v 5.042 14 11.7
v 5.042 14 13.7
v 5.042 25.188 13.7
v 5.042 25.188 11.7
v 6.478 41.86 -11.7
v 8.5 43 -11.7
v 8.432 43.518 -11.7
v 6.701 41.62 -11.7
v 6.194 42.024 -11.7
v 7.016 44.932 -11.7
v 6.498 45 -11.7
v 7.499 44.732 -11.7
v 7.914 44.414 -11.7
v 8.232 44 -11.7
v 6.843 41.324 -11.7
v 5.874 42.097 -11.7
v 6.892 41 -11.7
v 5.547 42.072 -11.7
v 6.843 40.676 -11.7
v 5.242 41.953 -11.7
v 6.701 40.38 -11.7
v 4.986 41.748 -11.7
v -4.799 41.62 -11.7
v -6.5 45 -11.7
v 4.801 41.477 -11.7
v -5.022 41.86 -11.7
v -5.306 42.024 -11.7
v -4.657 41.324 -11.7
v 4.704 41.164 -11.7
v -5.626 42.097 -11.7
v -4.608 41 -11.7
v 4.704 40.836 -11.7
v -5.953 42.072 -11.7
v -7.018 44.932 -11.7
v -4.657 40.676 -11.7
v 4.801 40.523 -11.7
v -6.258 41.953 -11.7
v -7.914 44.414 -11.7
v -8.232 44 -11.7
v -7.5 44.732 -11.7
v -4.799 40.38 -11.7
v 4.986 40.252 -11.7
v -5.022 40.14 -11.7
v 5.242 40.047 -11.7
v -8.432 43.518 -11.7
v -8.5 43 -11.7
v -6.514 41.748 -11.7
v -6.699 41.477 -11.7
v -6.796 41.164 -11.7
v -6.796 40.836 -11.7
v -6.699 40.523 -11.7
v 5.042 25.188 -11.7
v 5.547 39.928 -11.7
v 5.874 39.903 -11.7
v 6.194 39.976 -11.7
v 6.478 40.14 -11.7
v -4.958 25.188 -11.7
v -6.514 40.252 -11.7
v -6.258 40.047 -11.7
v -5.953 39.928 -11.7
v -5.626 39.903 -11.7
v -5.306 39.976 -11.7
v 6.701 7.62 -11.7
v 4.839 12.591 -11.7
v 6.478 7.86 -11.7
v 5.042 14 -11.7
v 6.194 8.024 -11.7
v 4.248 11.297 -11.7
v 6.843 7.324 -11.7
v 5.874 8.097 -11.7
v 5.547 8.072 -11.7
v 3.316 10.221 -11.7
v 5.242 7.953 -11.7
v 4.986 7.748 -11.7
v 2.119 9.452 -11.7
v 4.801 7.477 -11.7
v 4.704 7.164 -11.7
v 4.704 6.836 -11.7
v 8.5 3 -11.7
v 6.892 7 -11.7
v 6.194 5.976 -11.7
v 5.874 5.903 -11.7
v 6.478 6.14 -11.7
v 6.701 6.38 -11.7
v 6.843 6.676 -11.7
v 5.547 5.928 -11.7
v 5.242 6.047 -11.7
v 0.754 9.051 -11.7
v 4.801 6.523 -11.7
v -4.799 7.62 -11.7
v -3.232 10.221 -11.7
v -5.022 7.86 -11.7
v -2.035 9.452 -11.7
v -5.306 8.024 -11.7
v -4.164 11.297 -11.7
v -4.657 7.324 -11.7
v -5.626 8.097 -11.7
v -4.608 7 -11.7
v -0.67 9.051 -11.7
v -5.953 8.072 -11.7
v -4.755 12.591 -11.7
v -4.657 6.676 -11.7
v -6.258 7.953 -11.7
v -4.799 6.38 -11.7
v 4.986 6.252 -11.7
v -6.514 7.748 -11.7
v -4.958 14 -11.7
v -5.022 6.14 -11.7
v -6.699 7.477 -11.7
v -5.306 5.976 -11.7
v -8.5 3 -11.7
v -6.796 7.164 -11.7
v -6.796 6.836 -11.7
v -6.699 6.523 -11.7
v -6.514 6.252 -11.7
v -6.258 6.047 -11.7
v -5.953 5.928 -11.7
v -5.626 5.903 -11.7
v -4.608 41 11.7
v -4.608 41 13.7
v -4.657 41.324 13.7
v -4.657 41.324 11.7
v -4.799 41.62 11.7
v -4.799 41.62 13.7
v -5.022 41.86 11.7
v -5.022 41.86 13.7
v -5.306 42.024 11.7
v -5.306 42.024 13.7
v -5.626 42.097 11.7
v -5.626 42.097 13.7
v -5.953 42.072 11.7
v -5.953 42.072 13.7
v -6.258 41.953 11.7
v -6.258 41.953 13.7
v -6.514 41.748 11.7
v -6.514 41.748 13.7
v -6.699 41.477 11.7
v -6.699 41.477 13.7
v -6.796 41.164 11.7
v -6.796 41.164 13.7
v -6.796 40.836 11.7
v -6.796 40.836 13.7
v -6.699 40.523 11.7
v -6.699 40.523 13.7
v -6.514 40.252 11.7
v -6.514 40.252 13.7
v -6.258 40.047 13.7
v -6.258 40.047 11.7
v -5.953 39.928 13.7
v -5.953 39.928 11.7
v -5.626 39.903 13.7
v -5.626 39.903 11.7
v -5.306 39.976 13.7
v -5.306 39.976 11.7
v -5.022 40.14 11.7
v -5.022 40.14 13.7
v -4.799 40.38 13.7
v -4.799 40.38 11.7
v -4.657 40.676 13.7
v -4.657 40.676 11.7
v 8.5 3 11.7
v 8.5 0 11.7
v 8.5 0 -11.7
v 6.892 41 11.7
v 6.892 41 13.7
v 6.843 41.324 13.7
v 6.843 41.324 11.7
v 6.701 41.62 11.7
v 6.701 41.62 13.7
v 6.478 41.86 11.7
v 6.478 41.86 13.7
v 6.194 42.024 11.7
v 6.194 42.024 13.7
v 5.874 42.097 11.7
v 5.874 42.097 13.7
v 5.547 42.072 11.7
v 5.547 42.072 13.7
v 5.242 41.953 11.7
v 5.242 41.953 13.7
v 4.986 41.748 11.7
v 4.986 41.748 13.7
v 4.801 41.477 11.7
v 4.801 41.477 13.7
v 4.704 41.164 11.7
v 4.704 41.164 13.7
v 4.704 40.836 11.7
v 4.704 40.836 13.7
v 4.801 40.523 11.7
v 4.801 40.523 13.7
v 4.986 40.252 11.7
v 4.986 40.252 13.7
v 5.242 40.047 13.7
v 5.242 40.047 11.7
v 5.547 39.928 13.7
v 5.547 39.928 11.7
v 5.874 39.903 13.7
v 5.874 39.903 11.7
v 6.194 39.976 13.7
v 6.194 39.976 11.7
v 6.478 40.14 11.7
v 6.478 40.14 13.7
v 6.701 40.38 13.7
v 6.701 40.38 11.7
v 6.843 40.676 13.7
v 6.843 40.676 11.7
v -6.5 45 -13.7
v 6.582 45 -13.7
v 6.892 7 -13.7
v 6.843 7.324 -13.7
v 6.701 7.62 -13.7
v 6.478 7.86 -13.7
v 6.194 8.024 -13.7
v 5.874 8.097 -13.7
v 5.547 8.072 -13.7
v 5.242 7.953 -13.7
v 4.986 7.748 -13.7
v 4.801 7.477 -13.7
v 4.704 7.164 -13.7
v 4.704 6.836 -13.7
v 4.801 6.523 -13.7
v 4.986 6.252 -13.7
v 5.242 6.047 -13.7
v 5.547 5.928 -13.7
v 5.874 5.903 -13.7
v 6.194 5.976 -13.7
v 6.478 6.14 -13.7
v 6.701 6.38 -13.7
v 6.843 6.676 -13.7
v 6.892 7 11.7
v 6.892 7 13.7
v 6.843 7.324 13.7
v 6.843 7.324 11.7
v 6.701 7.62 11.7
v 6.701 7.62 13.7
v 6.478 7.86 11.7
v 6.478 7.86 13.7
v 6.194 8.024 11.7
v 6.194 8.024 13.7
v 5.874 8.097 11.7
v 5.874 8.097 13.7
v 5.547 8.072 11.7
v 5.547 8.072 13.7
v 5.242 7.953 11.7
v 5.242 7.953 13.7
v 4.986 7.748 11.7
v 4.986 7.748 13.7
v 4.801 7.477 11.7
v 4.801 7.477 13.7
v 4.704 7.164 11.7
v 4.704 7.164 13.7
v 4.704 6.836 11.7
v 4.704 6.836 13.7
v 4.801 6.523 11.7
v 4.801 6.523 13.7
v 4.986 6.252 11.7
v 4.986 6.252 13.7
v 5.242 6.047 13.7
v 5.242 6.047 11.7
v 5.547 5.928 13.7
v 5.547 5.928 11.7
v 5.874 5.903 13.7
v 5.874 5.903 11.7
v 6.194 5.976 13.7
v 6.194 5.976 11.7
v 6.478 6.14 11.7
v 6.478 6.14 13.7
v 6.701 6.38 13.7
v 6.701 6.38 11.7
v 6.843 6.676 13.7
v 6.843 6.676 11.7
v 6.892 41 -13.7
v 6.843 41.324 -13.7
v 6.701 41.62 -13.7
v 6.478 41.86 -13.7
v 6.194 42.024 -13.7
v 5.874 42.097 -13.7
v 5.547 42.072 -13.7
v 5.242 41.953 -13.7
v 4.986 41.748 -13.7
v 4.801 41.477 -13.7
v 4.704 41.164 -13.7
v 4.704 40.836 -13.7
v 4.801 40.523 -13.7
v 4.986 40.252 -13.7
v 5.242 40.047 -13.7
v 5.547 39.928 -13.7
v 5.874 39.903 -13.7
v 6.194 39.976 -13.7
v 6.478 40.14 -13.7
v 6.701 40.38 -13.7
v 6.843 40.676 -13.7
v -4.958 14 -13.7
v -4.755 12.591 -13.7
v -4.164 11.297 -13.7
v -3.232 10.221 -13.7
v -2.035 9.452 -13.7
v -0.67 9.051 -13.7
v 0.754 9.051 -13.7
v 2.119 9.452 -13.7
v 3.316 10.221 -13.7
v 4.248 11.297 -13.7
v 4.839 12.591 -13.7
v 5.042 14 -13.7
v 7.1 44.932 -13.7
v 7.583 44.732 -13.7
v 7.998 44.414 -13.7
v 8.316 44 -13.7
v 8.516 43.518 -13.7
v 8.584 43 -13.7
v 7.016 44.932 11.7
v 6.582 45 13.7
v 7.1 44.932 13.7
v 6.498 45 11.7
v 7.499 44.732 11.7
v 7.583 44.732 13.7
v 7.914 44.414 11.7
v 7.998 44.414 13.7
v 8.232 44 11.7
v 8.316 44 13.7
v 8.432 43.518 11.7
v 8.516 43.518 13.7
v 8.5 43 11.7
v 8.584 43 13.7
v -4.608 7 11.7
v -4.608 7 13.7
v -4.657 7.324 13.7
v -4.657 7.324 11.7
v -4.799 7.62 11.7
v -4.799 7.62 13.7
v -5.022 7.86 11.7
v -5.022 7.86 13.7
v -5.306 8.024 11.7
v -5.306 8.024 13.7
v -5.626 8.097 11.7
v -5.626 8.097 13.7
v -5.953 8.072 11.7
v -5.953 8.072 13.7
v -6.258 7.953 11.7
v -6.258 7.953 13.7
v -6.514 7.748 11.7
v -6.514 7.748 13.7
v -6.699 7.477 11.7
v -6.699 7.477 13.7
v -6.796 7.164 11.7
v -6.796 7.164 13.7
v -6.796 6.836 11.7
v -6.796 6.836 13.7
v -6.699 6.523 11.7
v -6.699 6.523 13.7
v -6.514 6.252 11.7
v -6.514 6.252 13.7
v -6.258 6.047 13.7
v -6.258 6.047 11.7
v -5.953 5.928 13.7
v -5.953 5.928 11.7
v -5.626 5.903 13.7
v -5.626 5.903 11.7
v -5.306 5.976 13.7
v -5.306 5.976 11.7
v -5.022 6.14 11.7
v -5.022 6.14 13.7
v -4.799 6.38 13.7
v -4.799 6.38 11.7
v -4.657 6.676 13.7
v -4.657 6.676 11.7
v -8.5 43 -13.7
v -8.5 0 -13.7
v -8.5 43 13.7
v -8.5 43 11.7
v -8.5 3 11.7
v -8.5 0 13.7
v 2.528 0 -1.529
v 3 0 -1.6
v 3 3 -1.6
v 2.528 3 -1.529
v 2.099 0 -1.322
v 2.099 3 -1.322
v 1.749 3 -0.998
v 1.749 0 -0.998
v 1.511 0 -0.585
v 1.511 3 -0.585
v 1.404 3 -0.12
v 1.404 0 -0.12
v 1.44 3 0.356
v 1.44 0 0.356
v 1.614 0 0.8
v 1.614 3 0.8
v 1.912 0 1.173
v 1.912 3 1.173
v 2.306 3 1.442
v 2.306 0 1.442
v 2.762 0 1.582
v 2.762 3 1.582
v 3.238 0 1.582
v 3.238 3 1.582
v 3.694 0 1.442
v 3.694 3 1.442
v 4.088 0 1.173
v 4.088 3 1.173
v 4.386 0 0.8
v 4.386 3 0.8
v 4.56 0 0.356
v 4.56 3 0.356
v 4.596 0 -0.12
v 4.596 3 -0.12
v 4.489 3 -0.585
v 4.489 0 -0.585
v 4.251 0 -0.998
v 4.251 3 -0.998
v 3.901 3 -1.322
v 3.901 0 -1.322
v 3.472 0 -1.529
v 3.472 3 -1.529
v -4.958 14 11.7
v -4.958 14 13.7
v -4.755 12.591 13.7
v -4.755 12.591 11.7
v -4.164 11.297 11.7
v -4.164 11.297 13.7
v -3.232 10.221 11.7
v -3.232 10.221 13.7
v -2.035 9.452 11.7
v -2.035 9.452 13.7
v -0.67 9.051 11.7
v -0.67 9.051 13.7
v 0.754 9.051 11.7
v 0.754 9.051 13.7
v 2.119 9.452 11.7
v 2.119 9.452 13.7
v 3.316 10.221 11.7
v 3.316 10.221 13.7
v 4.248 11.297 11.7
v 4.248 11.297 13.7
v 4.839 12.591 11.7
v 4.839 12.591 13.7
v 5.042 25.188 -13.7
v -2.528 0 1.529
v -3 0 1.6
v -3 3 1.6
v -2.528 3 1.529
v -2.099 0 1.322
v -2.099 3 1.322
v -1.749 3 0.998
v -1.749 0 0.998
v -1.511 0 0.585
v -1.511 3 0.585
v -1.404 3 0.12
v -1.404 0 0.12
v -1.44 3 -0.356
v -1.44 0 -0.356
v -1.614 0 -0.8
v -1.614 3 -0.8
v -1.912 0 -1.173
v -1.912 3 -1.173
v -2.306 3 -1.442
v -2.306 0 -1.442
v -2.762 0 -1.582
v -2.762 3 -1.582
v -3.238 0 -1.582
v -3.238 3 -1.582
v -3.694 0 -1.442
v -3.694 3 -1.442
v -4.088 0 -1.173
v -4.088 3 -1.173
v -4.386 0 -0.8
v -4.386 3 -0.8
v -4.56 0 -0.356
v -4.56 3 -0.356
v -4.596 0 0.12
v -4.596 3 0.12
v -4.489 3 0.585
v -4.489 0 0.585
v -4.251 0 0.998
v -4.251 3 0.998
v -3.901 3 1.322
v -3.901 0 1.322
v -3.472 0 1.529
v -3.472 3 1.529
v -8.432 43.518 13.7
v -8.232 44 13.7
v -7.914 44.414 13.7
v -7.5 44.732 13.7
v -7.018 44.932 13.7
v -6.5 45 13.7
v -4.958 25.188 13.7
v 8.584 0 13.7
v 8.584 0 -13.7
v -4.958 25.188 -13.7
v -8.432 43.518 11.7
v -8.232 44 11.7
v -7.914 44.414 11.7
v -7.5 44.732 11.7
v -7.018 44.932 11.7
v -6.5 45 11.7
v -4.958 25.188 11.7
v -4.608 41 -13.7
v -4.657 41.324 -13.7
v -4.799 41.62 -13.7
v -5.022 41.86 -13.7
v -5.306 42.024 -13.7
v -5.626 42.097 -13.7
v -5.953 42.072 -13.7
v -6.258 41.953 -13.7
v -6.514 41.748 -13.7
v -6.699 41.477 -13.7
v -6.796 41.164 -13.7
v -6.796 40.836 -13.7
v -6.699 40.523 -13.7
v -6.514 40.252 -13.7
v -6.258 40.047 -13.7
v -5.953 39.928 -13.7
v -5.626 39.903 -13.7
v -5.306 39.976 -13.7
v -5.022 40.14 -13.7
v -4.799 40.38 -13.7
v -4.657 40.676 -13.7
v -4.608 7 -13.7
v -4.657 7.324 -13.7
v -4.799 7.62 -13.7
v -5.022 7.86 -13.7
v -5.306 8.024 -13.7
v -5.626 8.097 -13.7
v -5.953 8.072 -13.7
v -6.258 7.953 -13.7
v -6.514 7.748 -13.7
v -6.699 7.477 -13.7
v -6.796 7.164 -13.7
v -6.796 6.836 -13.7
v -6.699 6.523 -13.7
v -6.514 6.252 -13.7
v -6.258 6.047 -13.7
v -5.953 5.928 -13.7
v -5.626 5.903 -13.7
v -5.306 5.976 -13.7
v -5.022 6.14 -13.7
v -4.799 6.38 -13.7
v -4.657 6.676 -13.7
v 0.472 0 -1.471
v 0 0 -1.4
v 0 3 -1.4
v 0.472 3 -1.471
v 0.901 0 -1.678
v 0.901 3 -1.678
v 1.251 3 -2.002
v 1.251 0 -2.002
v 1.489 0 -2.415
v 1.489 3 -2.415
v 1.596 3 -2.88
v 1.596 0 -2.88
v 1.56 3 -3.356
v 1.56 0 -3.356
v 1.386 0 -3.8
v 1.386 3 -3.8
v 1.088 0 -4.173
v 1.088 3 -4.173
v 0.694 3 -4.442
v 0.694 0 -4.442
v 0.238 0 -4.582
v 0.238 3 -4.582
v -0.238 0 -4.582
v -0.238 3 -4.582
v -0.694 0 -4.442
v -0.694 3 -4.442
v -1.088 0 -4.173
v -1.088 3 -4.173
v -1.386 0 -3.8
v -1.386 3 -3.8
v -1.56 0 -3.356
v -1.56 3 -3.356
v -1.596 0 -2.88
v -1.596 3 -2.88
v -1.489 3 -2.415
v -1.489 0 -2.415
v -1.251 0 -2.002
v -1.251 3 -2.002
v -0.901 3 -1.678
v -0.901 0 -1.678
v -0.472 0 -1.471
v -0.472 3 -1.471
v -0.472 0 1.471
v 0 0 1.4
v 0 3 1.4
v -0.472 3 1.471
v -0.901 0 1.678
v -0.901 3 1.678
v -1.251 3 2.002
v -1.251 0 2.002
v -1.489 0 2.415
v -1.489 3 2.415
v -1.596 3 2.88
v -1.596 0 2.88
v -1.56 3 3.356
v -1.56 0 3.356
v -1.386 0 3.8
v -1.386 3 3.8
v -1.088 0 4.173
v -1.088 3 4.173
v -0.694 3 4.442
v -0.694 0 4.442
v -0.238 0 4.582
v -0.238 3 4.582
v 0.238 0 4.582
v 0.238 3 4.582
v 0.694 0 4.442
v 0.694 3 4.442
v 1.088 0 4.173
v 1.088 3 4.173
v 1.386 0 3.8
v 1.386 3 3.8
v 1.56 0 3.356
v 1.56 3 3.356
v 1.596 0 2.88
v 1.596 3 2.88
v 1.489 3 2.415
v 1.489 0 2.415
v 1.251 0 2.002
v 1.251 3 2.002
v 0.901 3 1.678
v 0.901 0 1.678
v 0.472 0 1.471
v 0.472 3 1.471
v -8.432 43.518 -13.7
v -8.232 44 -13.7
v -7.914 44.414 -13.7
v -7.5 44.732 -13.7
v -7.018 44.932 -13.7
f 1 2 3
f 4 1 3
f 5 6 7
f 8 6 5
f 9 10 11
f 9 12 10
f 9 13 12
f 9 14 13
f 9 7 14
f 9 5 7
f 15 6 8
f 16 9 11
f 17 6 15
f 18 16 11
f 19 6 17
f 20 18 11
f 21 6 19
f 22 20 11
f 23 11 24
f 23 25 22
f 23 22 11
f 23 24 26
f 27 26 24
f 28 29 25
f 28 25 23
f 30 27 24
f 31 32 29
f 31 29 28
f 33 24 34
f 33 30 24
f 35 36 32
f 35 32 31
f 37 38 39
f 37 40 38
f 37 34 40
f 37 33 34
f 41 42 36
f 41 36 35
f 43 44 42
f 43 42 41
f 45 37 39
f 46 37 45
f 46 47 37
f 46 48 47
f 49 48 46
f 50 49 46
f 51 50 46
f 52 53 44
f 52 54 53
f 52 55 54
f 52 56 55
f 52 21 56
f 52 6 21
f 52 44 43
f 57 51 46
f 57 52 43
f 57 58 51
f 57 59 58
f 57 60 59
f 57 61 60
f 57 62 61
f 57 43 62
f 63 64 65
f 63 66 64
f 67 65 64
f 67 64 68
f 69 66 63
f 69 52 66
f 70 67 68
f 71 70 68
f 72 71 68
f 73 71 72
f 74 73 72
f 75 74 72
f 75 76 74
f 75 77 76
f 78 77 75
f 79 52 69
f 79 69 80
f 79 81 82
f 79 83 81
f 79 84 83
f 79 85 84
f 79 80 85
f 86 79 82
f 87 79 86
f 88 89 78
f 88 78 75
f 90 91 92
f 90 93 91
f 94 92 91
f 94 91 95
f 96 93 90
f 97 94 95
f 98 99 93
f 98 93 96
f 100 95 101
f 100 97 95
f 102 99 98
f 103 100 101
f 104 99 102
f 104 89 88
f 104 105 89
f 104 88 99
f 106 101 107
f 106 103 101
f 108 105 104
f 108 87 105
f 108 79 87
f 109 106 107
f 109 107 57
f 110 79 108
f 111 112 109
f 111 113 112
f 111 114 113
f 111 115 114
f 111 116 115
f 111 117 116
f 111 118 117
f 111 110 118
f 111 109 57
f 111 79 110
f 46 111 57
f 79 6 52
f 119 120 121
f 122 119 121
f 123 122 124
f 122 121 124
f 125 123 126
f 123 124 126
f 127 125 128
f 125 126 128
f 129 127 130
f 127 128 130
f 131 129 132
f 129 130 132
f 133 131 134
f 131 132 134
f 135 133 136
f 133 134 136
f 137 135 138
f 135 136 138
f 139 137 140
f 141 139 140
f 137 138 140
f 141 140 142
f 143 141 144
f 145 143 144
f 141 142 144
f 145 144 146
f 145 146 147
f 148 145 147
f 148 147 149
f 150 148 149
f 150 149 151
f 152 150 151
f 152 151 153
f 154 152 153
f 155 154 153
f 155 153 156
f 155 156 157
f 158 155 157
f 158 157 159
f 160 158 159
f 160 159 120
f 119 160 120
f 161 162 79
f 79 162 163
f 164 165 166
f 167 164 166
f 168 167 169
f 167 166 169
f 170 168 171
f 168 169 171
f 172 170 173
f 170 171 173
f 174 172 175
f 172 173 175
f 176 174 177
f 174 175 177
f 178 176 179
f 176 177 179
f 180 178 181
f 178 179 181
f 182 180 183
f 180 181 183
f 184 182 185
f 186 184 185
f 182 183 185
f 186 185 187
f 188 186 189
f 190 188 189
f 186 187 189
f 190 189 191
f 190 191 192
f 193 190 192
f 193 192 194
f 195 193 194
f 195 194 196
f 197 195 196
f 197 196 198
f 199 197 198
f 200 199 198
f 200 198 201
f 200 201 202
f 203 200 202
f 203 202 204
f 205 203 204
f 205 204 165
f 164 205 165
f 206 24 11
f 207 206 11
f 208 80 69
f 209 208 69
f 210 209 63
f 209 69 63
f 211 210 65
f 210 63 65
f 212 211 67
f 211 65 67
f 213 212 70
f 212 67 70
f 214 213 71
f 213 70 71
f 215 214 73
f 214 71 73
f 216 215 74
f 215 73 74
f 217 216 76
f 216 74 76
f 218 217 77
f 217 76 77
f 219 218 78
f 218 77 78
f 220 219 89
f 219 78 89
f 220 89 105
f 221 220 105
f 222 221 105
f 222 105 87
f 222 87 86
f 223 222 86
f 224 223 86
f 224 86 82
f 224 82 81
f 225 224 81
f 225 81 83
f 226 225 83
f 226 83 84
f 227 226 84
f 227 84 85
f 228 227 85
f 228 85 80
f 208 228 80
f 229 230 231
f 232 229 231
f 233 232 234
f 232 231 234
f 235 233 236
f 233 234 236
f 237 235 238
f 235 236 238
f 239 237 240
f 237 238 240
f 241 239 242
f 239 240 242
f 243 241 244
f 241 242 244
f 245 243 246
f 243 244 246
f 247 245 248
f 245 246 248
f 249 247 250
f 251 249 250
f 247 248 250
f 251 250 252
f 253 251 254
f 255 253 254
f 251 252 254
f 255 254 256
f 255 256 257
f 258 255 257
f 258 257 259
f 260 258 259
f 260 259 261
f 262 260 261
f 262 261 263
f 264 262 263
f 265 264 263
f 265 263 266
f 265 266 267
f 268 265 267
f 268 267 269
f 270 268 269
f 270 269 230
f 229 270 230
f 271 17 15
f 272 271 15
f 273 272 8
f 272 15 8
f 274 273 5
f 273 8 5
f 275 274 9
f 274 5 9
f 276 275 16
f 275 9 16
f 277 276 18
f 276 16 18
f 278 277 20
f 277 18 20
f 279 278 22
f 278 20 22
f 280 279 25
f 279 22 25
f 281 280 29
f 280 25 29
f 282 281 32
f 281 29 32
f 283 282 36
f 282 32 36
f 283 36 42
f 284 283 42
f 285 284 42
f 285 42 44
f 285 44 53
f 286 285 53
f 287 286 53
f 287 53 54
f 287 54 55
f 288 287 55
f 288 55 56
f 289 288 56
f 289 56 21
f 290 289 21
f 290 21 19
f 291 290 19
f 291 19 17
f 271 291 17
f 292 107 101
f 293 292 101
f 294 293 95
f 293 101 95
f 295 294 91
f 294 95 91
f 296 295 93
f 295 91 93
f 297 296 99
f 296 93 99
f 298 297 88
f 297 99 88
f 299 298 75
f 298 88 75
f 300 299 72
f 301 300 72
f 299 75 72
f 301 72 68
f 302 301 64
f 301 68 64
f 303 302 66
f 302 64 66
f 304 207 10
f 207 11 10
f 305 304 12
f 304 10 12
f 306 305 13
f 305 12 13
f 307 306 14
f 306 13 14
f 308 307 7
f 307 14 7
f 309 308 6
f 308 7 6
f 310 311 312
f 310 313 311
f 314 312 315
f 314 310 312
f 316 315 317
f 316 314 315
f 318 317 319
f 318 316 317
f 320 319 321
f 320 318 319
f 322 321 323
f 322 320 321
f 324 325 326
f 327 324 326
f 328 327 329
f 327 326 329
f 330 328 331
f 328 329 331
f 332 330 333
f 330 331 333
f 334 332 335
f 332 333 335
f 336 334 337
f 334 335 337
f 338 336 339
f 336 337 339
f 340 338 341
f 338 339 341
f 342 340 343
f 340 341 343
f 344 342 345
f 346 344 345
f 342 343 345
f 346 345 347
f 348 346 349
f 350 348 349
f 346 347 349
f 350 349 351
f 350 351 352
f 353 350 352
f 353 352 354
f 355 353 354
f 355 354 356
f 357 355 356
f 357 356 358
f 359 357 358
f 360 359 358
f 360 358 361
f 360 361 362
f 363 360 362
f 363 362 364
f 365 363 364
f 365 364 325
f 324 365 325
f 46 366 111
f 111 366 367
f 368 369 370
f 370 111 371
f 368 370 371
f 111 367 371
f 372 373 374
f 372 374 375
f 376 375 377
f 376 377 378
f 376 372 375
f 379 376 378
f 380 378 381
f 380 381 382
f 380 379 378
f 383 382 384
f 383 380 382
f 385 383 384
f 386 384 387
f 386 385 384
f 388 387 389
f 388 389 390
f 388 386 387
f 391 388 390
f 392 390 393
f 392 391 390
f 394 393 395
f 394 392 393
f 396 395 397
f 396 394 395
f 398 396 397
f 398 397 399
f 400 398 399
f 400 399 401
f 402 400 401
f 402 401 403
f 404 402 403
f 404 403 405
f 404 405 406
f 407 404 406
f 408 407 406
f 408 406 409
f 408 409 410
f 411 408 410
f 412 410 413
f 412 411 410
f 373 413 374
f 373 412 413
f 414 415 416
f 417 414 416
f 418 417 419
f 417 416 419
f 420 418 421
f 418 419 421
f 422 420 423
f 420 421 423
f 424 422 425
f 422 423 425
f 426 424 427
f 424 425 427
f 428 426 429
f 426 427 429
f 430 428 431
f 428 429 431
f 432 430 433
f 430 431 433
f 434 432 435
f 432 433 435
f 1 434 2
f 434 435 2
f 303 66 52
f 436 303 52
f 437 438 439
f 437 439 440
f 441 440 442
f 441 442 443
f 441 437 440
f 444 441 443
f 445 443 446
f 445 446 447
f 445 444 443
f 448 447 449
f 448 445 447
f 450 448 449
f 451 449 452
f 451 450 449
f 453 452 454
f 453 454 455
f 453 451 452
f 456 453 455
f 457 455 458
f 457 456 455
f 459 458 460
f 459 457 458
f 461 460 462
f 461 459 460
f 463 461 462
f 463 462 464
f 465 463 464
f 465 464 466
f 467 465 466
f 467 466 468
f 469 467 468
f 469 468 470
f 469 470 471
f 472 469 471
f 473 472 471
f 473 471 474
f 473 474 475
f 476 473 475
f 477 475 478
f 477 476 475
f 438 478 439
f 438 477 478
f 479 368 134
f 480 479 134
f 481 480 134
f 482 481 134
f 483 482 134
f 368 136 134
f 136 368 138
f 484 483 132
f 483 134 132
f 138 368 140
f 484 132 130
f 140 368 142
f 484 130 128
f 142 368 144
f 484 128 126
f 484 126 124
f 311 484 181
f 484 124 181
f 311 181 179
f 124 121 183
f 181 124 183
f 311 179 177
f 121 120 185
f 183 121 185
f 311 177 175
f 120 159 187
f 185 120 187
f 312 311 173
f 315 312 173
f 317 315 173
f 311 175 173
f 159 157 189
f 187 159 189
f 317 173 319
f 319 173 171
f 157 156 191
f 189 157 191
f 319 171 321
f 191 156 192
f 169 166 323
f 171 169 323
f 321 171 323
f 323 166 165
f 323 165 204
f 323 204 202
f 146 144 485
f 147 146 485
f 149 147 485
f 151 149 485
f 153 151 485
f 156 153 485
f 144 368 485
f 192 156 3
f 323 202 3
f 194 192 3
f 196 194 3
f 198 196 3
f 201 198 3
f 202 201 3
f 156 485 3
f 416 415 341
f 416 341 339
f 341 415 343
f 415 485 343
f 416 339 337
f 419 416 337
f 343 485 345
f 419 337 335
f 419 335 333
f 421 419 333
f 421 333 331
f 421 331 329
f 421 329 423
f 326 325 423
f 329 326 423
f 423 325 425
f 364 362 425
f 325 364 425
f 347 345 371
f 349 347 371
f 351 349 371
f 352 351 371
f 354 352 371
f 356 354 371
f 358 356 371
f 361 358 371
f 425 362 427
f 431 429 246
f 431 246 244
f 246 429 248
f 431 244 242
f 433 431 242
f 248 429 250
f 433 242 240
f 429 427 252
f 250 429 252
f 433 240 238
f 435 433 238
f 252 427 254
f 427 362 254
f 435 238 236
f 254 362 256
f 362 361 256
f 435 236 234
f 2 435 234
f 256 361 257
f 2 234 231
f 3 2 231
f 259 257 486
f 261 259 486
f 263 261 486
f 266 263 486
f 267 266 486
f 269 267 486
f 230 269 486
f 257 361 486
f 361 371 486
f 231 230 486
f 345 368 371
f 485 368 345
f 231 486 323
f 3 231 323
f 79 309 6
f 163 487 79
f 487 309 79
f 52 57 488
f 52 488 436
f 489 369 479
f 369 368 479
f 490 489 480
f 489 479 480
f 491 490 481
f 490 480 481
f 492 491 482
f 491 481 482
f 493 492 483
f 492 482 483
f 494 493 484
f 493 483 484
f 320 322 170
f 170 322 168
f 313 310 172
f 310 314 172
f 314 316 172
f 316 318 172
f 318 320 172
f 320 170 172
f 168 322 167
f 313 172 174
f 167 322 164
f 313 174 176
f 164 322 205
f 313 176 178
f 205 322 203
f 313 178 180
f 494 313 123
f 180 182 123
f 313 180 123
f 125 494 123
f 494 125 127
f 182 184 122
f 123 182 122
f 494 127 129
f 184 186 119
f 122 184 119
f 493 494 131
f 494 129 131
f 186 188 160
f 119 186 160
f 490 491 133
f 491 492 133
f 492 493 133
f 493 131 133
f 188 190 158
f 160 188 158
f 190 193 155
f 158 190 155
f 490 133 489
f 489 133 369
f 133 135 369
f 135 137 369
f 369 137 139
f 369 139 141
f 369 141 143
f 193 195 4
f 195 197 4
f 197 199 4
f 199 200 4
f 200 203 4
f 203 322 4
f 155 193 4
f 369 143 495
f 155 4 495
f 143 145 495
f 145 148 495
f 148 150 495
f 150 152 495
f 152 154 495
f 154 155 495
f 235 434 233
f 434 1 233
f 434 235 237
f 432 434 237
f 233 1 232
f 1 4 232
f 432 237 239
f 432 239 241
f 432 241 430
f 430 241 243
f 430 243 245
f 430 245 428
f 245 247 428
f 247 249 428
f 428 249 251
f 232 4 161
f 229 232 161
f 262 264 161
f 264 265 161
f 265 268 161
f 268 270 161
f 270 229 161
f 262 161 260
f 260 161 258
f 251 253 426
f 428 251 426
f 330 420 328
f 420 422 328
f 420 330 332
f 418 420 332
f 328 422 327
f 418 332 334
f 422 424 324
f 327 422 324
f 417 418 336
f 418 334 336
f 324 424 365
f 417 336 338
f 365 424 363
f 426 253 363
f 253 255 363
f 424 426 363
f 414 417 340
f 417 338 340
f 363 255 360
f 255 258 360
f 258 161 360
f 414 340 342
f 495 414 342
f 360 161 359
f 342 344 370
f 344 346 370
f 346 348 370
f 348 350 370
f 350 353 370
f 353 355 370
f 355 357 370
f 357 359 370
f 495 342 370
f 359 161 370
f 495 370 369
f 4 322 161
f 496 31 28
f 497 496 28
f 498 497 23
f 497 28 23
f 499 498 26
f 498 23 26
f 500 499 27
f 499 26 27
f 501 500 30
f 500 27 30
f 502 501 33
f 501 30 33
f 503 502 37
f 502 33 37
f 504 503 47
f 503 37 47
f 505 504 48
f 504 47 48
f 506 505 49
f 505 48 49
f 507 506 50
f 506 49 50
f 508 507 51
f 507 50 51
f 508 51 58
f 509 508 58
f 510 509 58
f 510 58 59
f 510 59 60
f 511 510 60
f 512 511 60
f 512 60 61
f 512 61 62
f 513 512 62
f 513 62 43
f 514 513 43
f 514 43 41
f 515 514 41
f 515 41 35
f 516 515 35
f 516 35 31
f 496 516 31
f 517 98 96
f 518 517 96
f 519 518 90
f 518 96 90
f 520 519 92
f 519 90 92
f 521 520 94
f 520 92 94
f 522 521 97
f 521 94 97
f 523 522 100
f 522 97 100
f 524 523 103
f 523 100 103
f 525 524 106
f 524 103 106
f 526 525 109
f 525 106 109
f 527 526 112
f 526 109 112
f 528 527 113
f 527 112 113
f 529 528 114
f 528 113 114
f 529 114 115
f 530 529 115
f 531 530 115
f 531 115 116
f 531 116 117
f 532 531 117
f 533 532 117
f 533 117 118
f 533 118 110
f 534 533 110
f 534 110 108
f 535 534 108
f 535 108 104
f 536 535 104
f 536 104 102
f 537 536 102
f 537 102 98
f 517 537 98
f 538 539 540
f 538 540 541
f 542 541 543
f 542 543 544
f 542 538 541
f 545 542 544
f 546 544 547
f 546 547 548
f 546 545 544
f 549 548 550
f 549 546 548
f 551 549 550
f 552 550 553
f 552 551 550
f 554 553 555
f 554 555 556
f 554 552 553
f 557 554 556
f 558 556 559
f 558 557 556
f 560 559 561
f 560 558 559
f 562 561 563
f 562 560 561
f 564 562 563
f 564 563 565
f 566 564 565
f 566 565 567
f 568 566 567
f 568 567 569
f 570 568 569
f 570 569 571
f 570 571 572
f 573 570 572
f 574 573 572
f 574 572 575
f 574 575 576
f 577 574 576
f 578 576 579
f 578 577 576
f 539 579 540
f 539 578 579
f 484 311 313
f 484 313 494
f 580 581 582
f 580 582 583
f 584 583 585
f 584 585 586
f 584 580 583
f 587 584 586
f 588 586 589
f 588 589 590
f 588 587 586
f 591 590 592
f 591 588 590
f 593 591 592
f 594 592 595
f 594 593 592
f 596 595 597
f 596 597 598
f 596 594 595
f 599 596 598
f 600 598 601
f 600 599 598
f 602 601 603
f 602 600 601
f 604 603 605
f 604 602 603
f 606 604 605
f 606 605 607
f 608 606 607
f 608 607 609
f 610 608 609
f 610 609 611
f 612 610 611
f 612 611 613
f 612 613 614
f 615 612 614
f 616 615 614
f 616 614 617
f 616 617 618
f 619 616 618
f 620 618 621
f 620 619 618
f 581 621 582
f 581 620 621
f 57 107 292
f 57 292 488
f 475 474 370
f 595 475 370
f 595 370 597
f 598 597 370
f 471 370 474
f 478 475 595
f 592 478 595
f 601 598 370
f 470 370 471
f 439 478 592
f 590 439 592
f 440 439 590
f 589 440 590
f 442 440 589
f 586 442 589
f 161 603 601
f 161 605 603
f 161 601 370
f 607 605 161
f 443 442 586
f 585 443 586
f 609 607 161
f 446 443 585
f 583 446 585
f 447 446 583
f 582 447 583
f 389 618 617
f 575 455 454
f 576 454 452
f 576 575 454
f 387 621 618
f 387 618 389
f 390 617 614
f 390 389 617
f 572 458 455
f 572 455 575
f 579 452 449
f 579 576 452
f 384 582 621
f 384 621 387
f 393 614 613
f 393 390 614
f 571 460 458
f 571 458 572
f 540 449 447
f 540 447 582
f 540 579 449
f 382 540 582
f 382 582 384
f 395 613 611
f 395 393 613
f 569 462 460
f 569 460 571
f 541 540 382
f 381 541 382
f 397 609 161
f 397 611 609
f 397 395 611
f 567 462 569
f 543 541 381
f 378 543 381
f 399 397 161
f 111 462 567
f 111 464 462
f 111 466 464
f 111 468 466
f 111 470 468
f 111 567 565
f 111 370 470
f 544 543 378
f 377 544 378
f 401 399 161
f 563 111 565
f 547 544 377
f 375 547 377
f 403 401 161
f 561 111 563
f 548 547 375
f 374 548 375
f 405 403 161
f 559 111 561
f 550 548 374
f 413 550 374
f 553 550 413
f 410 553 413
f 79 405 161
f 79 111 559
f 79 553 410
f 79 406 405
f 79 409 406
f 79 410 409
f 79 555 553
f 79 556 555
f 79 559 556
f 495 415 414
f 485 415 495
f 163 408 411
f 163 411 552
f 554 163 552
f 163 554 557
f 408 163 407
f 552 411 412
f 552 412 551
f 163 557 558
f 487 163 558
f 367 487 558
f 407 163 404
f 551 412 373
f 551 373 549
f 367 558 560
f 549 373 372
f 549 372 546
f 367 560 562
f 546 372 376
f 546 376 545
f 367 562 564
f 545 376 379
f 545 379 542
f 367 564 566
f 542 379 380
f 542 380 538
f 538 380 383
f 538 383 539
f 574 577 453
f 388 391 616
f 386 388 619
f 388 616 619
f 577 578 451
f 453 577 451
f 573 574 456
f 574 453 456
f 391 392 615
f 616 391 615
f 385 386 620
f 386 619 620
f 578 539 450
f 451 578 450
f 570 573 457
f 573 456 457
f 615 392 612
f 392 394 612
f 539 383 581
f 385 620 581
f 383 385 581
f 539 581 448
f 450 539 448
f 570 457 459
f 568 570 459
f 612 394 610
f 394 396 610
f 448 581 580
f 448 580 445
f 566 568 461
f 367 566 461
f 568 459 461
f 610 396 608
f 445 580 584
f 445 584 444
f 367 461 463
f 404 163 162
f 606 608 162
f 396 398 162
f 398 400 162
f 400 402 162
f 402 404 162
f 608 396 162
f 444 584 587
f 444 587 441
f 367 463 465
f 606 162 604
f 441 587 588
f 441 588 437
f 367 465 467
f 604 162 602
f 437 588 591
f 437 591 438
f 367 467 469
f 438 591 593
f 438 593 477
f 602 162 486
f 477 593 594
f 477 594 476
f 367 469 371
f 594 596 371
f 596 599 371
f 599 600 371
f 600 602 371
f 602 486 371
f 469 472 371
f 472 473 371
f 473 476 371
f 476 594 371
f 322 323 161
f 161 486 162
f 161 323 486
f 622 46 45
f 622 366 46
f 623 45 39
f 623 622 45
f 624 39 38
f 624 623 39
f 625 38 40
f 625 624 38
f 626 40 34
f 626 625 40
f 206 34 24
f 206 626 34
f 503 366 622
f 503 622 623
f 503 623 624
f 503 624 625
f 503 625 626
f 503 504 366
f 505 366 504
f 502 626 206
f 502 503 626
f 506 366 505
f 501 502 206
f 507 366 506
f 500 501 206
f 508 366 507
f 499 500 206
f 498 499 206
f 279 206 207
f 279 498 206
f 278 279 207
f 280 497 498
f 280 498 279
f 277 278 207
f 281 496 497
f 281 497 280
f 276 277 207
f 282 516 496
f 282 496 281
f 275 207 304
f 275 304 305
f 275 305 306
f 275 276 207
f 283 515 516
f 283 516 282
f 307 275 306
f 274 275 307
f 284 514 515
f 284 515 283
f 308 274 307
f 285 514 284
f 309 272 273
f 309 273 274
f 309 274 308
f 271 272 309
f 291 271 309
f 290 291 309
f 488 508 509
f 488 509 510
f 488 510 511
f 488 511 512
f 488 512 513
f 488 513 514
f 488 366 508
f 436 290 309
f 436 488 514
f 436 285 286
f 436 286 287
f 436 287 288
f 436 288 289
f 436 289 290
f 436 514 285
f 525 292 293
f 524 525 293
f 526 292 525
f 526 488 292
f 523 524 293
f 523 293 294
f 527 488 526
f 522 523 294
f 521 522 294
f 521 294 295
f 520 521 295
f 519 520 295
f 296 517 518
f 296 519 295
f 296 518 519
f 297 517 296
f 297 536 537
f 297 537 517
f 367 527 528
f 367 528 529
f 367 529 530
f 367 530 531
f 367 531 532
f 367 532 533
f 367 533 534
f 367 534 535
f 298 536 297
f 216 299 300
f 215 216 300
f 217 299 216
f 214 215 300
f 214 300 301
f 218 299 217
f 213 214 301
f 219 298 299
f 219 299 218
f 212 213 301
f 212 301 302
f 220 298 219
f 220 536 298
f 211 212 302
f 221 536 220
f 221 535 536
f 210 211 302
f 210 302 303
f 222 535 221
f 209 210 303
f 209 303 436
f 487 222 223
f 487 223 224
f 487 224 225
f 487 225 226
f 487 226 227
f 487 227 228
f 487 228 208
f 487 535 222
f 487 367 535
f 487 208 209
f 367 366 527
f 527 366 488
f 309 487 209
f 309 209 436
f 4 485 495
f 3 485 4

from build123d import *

# Parameters (mm, degrees)
SKETCH_1_W          = 17
SKETCH_1_H          = 23.4
SKETCH_1_R          = 1.6
EXTRUDE_1_DEPTH     = 3
EXTRUDE_3_DEPTH     = 45
SKETCH_3_R          = 1.1
SKETCH_3_R_2        = 5
CUT_EXTRUDE_1_DEPTH = 45
FILLET_1_R          = 2
SKETCH_4_W          = 10
SKETCH_4_H          = 11.187827488
CUT_EXTRUDE_2_DEPTH = 29


with BuildPart() as part:
    # 草图1 → 凸台-拉伸1 (new body)
    with BuildSketch(Plane(origin=(0, 0, 0), x_dir=(1, 0, 0), z_dir=(0, 1, 0))):
        Rectangle(SKETCH_1_W, SKETCH_1_H)
        with Locations(Location((0, 3, 0), (0, 0, 270))):
            Circle(SKETCH_1_R, mode=Mode.SUBTRACT)
        with Locations(Location((-3, 0, 0), (0, 0, 270))):
            Circle(SKETCH_1_R, mode=Mode.SUBTRACT)
        with Locations(Location((0, -3, 0), (0, 0, 90))):
            Circle(SKETCH_1_R, mode=Mode.SUBTRACT)
        with Locations(Location((3, 0, 0), (0, 0, 90))):
            Circle(SKETCH_1_R, mode=Mode.SUBTRACT)
    extrude(amount=EXTRUDE_1_DEPTH)

    # 草图2 → 凸台-拉伸3 (add)
    with BuildSketch(Plane.XZ):
        Polygon((-8.5, 11.7), (-8.5, 13.7), (8.584010661, 13.7), (8.5, 11.7), align=None)
        Polygon((8.584010661, -13.7), (8.5, -11.7), (-8.5, -11.7), (-8.5, -13.7), align=None)
    extrude(amount=-EXTRUDE_3_DEPTH)

    # 草图3 → 切除-拉伸1 (cut)
    with BuildSketch(Plane.XY.offset(13.7)):
        with Locations((-5.707994669, 41)):
            Circle(SKETCH_3_R)
        with Locations((5.792005331, 41)):
            Circle(SKETCH_3_R)
        with Locations((0.042005331, 14)):
            Circle(SKETCH_3_R_2)
        with Locations((-5.707994669, 7)):
            Circle(SKETCH_3_R)
        with Locations((5.792005331, 7)):
            Circle(SKETCH_3_R)
    extrude(amount=-CUT_EXTRUDE_1_DEPTH, mode=Mode.SUBTRACT)

    # 圆角1
    fillet_1_edges = [part.edges().sort_by_distance(p)[0] for p in [
        (-8.5, 45, 12.7),
        (8.542005331, 45, 12.7),
        (-8.5, 45, -12.7),
        (8.542005331, 45, -12.7),
    ]]
    fillet(fillet_1_edges, radius=FILLET_1_R)

    # 草图4 → 切除-拉伸2 (cut)
    with BuildSketch(Plane.XY.offset(13.7)):
        with Locations((0.042005331, 19.593913744)):
            Rectangle(SKETCH_4_W, SKETCH_4_H)
    extrude(amount=-CUT_EXTRUDE_2_DEPTH, mode=Mode.SUBTRACT)


solid = part.part
